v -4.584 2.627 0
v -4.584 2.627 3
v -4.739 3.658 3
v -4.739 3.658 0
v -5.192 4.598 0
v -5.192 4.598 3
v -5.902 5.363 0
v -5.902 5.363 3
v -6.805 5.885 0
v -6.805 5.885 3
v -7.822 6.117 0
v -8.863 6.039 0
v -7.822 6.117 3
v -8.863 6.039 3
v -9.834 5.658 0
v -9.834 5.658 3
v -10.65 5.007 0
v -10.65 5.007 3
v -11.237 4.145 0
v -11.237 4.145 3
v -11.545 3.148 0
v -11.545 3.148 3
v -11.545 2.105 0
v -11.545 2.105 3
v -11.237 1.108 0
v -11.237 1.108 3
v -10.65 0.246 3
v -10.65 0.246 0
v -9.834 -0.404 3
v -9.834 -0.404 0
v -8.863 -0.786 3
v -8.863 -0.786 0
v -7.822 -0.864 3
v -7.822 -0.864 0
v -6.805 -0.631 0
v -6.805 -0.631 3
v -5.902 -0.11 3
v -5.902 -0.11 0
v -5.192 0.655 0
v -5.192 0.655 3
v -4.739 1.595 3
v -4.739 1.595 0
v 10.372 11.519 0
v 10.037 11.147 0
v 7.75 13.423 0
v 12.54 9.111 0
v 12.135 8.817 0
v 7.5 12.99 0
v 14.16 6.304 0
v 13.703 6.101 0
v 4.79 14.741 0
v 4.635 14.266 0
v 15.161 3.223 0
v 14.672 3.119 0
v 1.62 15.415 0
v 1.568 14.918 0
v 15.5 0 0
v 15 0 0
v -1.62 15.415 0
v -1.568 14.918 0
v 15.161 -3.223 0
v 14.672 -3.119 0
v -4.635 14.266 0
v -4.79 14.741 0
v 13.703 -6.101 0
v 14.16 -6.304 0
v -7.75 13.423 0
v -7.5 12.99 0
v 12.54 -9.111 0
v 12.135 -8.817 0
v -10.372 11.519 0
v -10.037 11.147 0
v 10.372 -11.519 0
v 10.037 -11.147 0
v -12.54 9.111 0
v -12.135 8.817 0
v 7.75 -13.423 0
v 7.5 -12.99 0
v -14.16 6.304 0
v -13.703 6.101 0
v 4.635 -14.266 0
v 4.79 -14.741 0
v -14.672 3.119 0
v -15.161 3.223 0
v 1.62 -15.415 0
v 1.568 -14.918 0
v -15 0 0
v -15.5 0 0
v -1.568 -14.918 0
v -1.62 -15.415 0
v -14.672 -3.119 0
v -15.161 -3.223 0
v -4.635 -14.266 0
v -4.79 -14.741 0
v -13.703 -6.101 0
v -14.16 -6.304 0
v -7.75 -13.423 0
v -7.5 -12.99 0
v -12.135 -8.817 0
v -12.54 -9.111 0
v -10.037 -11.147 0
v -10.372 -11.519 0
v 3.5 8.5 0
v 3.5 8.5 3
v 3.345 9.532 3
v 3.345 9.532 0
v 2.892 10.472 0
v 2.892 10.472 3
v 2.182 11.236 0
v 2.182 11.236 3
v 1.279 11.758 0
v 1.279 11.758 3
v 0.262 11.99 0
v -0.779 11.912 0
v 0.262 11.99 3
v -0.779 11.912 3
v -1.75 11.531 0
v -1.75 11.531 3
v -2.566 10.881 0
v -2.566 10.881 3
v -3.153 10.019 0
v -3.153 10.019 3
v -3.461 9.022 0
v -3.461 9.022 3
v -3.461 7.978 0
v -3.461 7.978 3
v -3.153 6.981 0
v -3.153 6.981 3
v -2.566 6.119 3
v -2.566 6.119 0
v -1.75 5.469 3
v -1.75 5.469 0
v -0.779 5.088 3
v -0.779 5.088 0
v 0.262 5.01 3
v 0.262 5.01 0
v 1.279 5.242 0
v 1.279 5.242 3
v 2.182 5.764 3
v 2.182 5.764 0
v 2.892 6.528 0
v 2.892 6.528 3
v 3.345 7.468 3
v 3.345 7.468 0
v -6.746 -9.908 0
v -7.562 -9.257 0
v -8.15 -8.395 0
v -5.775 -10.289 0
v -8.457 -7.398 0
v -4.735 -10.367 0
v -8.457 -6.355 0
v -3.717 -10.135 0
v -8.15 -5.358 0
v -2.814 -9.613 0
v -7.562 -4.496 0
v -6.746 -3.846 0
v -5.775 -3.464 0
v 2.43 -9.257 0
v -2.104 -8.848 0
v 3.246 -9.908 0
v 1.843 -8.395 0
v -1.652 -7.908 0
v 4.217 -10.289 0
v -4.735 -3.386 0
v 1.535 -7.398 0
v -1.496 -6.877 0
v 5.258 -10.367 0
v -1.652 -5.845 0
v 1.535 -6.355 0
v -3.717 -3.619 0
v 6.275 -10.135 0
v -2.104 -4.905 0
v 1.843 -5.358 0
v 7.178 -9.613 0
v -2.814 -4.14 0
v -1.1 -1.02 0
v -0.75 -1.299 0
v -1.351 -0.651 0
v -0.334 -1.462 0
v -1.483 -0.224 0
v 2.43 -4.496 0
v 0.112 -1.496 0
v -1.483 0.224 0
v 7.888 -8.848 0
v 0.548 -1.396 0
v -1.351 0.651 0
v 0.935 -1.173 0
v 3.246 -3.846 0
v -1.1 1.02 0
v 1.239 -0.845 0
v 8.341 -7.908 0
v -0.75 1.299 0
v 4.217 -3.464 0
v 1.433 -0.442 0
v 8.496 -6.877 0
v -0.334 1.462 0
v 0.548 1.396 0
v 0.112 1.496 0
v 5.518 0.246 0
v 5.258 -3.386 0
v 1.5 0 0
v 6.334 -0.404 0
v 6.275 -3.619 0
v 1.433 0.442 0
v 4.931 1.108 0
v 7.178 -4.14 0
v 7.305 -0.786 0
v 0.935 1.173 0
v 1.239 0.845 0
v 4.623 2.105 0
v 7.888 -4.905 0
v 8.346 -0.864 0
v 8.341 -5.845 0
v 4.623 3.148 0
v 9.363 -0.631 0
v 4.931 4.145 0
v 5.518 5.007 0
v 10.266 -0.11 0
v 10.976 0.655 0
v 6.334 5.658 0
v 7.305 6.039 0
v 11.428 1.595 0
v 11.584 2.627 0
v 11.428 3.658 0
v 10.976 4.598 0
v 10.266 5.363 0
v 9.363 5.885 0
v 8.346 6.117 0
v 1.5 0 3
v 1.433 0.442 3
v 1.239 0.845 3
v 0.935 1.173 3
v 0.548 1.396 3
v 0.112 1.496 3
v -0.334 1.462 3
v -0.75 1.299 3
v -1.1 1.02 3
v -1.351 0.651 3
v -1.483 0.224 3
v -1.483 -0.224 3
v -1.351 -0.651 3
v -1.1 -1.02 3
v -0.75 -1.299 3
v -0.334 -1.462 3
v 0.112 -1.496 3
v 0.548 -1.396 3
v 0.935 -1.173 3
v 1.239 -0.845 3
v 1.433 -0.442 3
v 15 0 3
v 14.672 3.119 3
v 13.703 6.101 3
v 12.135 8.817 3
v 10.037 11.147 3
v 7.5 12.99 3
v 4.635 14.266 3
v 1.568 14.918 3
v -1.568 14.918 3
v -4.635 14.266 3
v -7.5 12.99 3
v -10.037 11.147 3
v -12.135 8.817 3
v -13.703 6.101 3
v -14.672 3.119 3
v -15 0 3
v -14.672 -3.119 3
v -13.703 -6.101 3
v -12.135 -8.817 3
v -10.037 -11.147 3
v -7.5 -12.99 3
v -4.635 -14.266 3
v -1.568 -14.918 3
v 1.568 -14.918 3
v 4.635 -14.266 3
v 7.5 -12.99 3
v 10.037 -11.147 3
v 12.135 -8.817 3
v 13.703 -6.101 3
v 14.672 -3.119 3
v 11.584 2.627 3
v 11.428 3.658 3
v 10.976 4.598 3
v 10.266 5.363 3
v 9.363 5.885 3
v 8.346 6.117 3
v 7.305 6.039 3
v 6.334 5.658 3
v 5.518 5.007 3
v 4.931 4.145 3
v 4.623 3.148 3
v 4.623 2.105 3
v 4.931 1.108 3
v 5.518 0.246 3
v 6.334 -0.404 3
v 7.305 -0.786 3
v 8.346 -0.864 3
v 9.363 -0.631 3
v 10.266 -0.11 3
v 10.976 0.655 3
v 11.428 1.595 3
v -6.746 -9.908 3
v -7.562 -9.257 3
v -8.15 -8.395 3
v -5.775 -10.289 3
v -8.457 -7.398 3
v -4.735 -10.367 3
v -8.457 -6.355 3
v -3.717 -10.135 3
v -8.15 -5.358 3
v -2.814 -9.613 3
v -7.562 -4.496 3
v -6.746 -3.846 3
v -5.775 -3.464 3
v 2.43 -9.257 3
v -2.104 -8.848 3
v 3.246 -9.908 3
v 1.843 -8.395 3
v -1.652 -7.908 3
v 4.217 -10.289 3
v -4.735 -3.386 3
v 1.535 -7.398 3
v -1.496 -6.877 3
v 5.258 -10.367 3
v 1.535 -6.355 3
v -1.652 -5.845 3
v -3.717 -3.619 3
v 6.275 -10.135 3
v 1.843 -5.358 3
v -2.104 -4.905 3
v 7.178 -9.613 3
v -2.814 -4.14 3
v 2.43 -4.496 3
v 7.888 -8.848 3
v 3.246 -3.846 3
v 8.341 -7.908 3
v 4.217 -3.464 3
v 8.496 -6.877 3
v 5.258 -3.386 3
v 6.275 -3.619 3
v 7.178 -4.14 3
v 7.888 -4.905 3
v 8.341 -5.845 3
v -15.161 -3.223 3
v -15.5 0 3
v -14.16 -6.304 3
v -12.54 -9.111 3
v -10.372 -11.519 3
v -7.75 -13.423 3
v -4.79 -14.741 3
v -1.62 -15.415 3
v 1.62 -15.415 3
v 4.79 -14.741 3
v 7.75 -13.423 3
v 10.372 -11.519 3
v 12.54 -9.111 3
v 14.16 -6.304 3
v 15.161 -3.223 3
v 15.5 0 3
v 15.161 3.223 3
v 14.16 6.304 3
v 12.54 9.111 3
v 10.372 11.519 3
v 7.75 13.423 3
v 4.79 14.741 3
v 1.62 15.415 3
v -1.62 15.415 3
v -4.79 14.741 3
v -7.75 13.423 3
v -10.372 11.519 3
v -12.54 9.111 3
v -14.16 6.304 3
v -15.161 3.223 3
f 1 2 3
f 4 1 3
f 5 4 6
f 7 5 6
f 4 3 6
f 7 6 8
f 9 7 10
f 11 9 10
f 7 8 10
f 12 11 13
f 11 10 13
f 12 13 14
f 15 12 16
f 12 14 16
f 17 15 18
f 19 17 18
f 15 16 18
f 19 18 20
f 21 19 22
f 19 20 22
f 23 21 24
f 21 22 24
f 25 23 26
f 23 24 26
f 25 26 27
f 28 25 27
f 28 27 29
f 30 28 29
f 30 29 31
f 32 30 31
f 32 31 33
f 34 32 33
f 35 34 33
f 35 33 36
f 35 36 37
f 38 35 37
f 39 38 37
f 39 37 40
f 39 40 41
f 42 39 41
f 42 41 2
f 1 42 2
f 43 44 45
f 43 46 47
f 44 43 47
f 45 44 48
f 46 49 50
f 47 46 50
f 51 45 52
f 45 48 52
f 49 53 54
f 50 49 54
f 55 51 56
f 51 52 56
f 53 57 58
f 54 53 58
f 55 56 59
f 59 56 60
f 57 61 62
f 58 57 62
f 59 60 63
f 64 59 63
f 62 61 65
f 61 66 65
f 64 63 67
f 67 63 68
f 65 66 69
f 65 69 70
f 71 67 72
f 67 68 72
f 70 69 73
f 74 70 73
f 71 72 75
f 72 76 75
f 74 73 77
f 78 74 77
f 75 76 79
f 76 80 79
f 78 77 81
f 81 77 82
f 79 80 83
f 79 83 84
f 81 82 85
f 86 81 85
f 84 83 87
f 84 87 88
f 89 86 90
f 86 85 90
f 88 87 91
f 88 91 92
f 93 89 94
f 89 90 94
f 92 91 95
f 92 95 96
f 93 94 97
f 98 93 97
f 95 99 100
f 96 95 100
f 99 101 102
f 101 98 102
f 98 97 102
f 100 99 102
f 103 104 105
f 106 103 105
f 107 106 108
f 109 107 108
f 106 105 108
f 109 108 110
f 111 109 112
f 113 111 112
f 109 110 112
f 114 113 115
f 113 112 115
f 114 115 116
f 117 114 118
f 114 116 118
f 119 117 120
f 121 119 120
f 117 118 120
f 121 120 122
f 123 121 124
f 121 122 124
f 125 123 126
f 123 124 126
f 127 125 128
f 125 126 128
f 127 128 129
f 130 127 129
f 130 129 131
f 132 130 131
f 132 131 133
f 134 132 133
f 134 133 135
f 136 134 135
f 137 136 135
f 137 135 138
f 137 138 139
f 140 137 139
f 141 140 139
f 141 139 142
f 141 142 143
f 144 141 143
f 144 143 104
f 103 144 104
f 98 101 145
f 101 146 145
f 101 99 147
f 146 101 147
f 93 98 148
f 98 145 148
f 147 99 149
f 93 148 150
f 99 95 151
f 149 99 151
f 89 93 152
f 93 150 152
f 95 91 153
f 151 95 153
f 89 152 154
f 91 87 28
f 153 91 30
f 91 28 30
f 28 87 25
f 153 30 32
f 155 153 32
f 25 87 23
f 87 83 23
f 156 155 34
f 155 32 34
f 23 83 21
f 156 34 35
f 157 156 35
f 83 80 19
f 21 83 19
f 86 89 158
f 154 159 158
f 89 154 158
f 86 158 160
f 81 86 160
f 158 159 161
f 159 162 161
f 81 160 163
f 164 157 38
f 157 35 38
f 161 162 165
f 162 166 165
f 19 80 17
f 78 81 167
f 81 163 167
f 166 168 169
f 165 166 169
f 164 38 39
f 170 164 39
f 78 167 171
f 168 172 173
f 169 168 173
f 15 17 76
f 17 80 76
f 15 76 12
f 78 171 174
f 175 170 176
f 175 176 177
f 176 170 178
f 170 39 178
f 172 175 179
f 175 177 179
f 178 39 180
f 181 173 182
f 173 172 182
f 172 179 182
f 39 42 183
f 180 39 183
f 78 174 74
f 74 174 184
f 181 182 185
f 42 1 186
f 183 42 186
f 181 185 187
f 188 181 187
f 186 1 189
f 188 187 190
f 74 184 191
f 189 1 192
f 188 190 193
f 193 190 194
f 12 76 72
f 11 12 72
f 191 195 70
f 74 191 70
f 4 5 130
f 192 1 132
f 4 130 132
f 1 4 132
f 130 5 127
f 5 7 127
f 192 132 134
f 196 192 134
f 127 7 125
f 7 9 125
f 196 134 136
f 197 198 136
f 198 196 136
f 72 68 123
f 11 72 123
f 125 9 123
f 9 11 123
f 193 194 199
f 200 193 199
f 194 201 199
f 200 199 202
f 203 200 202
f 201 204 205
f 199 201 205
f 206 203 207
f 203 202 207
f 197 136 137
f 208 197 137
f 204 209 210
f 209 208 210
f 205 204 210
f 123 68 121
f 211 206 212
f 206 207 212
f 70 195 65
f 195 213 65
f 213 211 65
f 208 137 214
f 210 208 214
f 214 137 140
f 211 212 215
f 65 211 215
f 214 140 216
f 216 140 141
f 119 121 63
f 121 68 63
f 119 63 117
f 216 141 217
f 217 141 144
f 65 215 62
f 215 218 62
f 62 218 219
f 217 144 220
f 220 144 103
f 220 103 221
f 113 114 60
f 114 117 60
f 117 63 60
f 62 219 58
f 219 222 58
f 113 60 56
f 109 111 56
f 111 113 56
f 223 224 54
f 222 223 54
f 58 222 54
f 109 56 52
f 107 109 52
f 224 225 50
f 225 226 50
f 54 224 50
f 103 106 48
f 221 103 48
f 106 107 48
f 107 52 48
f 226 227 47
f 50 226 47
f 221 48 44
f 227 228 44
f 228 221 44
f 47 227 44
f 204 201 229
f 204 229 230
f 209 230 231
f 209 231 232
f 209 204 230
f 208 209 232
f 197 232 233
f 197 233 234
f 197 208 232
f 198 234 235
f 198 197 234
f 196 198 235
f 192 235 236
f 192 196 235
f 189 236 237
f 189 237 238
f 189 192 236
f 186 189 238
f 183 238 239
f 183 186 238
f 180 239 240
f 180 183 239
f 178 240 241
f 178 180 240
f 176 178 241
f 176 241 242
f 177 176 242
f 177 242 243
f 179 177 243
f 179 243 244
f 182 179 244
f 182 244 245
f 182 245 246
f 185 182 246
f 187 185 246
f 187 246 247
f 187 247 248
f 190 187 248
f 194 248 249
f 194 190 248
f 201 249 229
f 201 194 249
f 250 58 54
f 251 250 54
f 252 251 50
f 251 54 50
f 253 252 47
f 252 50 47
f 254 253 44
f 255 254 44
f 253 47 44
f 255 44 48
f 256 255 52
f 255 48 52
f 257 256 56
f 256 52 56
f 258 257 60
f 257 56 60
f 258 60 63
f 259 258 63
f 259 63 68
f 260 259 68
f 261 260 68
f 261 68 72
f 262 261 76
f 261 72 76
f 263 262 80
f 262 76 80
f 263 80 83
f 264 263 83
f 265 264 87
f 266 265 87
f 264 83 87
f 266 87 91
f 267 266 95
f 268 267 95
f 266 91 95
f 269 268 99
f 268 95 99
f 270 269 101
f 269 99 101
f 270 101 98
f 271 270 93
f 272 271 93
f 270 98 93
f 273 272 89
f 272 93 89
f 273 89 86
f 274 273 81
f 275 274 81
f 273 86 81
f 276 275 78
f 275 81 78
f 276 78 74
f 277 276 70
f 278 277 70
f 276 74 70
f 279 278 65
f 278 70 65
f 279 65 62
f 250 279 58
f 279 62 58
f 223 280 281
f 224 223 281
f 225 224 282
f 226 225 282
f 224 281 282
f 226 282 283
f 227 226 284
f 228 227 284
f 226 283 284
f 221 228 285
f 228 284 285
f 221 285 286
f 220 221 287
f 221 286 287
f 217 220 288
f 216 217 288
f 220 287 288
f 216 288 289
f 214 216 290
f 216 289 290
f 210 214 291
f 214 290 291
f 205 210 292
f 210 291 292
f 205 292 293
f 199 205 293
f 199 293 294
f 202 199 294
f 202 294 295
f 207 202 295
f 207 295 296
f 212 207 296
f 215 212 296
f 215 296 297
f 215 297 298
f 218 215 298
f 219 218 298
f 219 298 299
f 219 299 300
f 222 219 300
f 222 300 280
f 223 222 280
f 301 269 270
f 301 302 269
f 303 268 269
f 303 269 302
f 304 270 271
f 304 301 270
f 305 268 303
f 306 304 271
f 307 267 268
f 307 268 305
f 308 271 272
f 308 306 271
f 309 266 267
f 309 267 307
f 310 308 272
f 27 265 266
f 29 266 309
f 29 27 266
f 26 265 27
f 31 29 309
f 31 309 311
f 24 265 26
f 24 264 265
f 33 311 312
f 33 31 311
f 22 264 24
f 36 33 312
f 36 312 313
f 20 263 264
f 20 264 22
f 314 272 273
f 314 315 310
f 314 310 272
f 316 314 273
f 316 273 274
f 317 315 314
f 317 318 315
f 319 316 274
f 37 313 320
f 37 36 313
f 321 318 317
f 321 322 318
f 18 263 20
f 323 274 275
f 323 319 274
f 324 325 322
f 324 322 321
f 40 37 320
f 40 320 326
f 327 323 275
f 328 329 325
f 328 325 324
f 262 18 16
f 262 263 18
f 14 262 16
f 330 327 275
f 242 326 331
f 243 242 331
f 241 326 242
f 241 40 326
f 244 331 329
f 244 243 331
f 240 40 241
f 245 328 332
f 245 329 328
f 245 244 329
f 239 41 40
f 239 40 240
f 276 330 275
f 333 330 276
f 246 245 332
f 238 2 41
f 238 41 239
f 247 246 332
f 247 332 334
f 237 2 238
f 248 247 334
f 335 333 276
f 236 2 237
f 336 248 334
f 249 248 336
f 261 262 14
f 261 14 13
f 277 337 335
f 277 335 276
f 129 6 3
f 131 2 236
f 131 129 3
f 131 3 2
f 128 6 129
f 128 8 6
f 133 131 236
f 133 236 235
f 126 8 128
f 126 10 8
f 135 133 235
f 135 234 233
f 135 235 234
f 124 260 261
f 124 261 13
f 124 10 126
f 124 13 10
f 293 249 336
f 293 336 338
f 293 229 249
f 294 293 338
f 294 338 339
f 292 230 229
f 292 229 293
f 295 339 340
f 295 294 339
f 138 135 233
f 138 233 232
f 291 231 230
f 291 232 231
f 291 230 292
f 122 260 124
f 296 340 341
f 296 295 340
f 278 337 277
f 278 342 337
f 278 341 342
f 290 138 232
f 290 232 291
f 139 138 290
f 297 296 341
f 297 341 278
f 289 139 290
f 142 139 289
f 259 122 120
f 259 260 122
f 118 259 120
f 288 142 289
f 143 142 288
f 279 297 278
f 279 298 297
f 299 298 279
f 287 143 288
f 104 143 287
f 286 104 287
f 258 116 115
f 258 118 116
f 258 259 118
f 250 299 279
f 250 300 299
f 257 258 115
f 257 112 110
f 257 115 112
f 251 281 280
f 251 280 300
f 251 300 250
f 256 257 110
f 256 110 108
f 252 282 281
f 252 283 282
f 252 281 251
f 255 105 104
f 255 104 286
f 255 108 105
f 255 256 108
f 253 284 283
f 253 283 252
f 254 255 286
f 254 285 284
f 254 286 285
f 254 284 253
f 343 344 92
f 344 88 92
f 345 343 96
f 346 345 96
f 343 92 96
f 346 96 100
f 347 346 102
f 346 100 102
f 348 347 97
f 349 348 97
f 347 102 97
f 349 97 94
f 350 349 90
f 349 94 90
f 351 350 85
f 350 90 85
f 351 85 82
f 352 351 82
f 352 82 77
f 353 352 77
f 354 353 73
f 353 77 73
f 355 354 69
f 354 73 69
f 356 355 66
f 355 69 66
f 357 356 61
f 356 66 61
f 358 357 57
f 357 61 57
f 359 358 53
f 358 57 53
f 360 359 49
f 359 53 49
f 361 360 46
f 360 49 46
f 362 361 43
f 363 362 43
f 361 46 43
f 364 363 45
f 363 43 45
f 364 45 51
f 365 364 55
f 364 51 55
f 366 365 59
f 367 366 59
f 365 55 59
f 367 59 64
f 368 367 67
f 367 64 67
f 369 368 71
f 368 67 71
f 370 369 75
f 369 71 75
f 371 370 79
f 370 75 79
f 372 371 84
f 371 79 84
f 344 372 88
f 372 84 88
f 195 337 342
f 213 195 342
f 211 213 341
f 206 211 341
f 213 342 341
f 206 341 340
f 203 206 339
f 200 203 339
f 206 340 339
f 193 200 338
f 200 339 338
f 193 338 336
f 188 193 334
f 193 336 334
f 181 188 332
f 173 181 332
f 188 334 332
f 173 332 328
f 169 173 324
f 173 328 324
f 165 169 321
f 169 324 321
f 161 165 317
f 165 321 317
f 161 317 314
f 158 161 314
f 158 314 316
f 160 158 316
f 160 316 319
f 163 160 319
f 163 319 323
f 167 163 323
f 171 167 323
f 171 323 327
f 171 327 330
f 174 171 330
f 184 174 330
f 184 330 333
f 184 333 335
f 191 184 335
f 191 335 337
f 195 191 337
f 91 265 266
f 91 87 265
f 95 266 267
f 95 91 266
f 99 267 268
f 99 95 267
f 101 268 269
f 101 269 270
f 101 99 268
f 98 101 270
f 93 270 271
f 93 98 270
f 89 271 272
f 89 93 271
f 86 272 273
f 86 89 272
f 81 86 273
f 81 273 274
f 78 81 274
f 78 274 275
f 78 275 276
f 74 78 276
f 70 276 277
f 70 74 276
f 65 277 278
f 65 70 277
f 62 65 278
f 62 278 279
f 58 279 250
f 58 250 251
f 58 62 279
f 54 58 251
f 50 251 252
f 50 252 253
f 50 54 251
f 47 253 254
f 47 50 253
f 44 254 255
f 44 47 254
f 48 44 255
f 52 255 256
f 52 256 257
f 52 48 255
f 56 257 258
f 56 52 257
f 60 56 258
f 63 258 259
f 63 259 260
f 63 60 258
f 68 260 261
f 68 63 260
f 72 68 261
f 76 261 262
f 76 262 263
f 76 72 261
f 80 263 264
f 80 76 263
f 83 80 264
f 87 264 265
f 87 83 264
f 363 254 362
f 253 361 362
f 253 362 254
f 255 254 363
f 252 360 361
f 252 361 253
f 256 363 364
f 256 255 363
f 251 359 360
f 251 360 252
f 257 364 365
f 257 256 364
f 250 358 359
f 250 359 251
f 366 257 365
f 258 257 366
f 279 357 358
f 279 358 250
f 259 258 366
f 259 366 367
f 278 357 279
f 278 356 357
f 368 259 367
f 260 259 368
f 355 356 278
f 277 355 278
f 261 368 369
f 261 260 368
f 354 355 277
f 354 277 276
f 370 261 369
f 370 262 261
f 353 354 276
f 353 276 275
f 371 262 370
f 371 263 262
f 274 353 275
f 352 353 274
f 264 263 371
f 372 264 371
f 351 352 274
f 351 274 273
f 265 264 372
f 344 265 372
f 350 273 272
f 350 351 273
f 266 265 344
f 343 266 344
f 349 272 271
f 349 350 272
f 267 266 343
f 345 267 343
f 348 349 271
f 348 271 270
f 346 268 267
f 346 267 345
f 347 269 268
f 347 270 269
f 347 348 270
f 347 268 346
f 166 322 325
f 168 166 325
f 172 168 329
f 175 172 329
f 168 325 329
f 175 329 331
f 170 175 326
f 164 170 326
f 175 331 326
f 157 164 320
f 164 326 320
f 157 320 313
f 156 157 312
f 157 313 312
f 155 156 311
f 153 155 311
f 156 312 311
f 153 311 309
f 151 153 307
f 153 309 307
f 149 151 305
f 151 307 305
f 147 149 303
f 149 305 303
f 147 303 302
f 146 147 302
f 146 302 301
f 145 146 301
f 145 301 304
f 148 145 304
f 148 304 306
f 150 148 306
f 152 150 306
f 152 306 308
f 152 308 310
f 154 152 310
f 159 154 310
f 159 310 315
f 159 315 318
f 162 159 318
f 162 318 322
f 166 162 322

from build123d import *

# Parameters (mm, degrees)
SKETCH1_R               = 15
SKETCH1_R_2             = 1.5
BOSS_EXTRUDE1_DEPTH     = 3
SKETCH4_R               = 3.5
CUT_EXTRUDE1_DEPTH      = 1
CUT_EXTRUDE1_DEPTH_BACK = 4
SKETCH2_W               = 0.5
SKETCH2_H               = 3


with BuildPart() as part:
    # Sketch1 → Boss-Extrude1 (new body)
    with BuildSketch(Plane.XY):
        Circle(SKETCH1_R)
        Circle(SKETCH1_R_2, mode=Mode.SUBTRACT)
    extrude(amount=BOSS_EXTRUDE1_DEPTH)

    # Sketch4 → Cut-Extrude1 (cut, two sides)
    with BuildSketch(Plane.XY.offset(3)) as cut_extrude1_sk:
        with Locations((0, 8.5)):
            Circle(SKETCH4_R)
        with Locations((8.083980389, 2.626644452)):
            Circle(SKETCH4_R)
        with Locations((4.996174644, -6.876644452)):
            Circle(SKETCH4_R)
        with Locations((-4.996174644, -6.876644452)):
            Circle(SKETCH4_R)
        with Locations((-8.083980389, 2.626644452)):
            Circle(SKETCH4_R)
    extrude(amount=CUT_EXTRUDE1_DEPTH, mode=Mode.SUBTRACT)
    extrude(cut_extrude1_sk.sketch, amount=-CUT_EXTRUDE1_DEPTH_BACK, mode=Mode.SUBTRACT)


with BuildPart() as body_2:
    # Sketch2 → Revolve1 (revolve)
    with BuildSketch(Plane(origin=(0, 0, 0), x_dir=(1, 0, 0), z_dir=(0, 1, 0))):
        with Locations((-15.25, -1.5)):
            Rectangle(SKETCH2_W, SKETCH2_H)
    revolve(axis=Axis((0, 0, 0), (0, 0, 1)))


solid = Compound([part.part, body_2.part])
